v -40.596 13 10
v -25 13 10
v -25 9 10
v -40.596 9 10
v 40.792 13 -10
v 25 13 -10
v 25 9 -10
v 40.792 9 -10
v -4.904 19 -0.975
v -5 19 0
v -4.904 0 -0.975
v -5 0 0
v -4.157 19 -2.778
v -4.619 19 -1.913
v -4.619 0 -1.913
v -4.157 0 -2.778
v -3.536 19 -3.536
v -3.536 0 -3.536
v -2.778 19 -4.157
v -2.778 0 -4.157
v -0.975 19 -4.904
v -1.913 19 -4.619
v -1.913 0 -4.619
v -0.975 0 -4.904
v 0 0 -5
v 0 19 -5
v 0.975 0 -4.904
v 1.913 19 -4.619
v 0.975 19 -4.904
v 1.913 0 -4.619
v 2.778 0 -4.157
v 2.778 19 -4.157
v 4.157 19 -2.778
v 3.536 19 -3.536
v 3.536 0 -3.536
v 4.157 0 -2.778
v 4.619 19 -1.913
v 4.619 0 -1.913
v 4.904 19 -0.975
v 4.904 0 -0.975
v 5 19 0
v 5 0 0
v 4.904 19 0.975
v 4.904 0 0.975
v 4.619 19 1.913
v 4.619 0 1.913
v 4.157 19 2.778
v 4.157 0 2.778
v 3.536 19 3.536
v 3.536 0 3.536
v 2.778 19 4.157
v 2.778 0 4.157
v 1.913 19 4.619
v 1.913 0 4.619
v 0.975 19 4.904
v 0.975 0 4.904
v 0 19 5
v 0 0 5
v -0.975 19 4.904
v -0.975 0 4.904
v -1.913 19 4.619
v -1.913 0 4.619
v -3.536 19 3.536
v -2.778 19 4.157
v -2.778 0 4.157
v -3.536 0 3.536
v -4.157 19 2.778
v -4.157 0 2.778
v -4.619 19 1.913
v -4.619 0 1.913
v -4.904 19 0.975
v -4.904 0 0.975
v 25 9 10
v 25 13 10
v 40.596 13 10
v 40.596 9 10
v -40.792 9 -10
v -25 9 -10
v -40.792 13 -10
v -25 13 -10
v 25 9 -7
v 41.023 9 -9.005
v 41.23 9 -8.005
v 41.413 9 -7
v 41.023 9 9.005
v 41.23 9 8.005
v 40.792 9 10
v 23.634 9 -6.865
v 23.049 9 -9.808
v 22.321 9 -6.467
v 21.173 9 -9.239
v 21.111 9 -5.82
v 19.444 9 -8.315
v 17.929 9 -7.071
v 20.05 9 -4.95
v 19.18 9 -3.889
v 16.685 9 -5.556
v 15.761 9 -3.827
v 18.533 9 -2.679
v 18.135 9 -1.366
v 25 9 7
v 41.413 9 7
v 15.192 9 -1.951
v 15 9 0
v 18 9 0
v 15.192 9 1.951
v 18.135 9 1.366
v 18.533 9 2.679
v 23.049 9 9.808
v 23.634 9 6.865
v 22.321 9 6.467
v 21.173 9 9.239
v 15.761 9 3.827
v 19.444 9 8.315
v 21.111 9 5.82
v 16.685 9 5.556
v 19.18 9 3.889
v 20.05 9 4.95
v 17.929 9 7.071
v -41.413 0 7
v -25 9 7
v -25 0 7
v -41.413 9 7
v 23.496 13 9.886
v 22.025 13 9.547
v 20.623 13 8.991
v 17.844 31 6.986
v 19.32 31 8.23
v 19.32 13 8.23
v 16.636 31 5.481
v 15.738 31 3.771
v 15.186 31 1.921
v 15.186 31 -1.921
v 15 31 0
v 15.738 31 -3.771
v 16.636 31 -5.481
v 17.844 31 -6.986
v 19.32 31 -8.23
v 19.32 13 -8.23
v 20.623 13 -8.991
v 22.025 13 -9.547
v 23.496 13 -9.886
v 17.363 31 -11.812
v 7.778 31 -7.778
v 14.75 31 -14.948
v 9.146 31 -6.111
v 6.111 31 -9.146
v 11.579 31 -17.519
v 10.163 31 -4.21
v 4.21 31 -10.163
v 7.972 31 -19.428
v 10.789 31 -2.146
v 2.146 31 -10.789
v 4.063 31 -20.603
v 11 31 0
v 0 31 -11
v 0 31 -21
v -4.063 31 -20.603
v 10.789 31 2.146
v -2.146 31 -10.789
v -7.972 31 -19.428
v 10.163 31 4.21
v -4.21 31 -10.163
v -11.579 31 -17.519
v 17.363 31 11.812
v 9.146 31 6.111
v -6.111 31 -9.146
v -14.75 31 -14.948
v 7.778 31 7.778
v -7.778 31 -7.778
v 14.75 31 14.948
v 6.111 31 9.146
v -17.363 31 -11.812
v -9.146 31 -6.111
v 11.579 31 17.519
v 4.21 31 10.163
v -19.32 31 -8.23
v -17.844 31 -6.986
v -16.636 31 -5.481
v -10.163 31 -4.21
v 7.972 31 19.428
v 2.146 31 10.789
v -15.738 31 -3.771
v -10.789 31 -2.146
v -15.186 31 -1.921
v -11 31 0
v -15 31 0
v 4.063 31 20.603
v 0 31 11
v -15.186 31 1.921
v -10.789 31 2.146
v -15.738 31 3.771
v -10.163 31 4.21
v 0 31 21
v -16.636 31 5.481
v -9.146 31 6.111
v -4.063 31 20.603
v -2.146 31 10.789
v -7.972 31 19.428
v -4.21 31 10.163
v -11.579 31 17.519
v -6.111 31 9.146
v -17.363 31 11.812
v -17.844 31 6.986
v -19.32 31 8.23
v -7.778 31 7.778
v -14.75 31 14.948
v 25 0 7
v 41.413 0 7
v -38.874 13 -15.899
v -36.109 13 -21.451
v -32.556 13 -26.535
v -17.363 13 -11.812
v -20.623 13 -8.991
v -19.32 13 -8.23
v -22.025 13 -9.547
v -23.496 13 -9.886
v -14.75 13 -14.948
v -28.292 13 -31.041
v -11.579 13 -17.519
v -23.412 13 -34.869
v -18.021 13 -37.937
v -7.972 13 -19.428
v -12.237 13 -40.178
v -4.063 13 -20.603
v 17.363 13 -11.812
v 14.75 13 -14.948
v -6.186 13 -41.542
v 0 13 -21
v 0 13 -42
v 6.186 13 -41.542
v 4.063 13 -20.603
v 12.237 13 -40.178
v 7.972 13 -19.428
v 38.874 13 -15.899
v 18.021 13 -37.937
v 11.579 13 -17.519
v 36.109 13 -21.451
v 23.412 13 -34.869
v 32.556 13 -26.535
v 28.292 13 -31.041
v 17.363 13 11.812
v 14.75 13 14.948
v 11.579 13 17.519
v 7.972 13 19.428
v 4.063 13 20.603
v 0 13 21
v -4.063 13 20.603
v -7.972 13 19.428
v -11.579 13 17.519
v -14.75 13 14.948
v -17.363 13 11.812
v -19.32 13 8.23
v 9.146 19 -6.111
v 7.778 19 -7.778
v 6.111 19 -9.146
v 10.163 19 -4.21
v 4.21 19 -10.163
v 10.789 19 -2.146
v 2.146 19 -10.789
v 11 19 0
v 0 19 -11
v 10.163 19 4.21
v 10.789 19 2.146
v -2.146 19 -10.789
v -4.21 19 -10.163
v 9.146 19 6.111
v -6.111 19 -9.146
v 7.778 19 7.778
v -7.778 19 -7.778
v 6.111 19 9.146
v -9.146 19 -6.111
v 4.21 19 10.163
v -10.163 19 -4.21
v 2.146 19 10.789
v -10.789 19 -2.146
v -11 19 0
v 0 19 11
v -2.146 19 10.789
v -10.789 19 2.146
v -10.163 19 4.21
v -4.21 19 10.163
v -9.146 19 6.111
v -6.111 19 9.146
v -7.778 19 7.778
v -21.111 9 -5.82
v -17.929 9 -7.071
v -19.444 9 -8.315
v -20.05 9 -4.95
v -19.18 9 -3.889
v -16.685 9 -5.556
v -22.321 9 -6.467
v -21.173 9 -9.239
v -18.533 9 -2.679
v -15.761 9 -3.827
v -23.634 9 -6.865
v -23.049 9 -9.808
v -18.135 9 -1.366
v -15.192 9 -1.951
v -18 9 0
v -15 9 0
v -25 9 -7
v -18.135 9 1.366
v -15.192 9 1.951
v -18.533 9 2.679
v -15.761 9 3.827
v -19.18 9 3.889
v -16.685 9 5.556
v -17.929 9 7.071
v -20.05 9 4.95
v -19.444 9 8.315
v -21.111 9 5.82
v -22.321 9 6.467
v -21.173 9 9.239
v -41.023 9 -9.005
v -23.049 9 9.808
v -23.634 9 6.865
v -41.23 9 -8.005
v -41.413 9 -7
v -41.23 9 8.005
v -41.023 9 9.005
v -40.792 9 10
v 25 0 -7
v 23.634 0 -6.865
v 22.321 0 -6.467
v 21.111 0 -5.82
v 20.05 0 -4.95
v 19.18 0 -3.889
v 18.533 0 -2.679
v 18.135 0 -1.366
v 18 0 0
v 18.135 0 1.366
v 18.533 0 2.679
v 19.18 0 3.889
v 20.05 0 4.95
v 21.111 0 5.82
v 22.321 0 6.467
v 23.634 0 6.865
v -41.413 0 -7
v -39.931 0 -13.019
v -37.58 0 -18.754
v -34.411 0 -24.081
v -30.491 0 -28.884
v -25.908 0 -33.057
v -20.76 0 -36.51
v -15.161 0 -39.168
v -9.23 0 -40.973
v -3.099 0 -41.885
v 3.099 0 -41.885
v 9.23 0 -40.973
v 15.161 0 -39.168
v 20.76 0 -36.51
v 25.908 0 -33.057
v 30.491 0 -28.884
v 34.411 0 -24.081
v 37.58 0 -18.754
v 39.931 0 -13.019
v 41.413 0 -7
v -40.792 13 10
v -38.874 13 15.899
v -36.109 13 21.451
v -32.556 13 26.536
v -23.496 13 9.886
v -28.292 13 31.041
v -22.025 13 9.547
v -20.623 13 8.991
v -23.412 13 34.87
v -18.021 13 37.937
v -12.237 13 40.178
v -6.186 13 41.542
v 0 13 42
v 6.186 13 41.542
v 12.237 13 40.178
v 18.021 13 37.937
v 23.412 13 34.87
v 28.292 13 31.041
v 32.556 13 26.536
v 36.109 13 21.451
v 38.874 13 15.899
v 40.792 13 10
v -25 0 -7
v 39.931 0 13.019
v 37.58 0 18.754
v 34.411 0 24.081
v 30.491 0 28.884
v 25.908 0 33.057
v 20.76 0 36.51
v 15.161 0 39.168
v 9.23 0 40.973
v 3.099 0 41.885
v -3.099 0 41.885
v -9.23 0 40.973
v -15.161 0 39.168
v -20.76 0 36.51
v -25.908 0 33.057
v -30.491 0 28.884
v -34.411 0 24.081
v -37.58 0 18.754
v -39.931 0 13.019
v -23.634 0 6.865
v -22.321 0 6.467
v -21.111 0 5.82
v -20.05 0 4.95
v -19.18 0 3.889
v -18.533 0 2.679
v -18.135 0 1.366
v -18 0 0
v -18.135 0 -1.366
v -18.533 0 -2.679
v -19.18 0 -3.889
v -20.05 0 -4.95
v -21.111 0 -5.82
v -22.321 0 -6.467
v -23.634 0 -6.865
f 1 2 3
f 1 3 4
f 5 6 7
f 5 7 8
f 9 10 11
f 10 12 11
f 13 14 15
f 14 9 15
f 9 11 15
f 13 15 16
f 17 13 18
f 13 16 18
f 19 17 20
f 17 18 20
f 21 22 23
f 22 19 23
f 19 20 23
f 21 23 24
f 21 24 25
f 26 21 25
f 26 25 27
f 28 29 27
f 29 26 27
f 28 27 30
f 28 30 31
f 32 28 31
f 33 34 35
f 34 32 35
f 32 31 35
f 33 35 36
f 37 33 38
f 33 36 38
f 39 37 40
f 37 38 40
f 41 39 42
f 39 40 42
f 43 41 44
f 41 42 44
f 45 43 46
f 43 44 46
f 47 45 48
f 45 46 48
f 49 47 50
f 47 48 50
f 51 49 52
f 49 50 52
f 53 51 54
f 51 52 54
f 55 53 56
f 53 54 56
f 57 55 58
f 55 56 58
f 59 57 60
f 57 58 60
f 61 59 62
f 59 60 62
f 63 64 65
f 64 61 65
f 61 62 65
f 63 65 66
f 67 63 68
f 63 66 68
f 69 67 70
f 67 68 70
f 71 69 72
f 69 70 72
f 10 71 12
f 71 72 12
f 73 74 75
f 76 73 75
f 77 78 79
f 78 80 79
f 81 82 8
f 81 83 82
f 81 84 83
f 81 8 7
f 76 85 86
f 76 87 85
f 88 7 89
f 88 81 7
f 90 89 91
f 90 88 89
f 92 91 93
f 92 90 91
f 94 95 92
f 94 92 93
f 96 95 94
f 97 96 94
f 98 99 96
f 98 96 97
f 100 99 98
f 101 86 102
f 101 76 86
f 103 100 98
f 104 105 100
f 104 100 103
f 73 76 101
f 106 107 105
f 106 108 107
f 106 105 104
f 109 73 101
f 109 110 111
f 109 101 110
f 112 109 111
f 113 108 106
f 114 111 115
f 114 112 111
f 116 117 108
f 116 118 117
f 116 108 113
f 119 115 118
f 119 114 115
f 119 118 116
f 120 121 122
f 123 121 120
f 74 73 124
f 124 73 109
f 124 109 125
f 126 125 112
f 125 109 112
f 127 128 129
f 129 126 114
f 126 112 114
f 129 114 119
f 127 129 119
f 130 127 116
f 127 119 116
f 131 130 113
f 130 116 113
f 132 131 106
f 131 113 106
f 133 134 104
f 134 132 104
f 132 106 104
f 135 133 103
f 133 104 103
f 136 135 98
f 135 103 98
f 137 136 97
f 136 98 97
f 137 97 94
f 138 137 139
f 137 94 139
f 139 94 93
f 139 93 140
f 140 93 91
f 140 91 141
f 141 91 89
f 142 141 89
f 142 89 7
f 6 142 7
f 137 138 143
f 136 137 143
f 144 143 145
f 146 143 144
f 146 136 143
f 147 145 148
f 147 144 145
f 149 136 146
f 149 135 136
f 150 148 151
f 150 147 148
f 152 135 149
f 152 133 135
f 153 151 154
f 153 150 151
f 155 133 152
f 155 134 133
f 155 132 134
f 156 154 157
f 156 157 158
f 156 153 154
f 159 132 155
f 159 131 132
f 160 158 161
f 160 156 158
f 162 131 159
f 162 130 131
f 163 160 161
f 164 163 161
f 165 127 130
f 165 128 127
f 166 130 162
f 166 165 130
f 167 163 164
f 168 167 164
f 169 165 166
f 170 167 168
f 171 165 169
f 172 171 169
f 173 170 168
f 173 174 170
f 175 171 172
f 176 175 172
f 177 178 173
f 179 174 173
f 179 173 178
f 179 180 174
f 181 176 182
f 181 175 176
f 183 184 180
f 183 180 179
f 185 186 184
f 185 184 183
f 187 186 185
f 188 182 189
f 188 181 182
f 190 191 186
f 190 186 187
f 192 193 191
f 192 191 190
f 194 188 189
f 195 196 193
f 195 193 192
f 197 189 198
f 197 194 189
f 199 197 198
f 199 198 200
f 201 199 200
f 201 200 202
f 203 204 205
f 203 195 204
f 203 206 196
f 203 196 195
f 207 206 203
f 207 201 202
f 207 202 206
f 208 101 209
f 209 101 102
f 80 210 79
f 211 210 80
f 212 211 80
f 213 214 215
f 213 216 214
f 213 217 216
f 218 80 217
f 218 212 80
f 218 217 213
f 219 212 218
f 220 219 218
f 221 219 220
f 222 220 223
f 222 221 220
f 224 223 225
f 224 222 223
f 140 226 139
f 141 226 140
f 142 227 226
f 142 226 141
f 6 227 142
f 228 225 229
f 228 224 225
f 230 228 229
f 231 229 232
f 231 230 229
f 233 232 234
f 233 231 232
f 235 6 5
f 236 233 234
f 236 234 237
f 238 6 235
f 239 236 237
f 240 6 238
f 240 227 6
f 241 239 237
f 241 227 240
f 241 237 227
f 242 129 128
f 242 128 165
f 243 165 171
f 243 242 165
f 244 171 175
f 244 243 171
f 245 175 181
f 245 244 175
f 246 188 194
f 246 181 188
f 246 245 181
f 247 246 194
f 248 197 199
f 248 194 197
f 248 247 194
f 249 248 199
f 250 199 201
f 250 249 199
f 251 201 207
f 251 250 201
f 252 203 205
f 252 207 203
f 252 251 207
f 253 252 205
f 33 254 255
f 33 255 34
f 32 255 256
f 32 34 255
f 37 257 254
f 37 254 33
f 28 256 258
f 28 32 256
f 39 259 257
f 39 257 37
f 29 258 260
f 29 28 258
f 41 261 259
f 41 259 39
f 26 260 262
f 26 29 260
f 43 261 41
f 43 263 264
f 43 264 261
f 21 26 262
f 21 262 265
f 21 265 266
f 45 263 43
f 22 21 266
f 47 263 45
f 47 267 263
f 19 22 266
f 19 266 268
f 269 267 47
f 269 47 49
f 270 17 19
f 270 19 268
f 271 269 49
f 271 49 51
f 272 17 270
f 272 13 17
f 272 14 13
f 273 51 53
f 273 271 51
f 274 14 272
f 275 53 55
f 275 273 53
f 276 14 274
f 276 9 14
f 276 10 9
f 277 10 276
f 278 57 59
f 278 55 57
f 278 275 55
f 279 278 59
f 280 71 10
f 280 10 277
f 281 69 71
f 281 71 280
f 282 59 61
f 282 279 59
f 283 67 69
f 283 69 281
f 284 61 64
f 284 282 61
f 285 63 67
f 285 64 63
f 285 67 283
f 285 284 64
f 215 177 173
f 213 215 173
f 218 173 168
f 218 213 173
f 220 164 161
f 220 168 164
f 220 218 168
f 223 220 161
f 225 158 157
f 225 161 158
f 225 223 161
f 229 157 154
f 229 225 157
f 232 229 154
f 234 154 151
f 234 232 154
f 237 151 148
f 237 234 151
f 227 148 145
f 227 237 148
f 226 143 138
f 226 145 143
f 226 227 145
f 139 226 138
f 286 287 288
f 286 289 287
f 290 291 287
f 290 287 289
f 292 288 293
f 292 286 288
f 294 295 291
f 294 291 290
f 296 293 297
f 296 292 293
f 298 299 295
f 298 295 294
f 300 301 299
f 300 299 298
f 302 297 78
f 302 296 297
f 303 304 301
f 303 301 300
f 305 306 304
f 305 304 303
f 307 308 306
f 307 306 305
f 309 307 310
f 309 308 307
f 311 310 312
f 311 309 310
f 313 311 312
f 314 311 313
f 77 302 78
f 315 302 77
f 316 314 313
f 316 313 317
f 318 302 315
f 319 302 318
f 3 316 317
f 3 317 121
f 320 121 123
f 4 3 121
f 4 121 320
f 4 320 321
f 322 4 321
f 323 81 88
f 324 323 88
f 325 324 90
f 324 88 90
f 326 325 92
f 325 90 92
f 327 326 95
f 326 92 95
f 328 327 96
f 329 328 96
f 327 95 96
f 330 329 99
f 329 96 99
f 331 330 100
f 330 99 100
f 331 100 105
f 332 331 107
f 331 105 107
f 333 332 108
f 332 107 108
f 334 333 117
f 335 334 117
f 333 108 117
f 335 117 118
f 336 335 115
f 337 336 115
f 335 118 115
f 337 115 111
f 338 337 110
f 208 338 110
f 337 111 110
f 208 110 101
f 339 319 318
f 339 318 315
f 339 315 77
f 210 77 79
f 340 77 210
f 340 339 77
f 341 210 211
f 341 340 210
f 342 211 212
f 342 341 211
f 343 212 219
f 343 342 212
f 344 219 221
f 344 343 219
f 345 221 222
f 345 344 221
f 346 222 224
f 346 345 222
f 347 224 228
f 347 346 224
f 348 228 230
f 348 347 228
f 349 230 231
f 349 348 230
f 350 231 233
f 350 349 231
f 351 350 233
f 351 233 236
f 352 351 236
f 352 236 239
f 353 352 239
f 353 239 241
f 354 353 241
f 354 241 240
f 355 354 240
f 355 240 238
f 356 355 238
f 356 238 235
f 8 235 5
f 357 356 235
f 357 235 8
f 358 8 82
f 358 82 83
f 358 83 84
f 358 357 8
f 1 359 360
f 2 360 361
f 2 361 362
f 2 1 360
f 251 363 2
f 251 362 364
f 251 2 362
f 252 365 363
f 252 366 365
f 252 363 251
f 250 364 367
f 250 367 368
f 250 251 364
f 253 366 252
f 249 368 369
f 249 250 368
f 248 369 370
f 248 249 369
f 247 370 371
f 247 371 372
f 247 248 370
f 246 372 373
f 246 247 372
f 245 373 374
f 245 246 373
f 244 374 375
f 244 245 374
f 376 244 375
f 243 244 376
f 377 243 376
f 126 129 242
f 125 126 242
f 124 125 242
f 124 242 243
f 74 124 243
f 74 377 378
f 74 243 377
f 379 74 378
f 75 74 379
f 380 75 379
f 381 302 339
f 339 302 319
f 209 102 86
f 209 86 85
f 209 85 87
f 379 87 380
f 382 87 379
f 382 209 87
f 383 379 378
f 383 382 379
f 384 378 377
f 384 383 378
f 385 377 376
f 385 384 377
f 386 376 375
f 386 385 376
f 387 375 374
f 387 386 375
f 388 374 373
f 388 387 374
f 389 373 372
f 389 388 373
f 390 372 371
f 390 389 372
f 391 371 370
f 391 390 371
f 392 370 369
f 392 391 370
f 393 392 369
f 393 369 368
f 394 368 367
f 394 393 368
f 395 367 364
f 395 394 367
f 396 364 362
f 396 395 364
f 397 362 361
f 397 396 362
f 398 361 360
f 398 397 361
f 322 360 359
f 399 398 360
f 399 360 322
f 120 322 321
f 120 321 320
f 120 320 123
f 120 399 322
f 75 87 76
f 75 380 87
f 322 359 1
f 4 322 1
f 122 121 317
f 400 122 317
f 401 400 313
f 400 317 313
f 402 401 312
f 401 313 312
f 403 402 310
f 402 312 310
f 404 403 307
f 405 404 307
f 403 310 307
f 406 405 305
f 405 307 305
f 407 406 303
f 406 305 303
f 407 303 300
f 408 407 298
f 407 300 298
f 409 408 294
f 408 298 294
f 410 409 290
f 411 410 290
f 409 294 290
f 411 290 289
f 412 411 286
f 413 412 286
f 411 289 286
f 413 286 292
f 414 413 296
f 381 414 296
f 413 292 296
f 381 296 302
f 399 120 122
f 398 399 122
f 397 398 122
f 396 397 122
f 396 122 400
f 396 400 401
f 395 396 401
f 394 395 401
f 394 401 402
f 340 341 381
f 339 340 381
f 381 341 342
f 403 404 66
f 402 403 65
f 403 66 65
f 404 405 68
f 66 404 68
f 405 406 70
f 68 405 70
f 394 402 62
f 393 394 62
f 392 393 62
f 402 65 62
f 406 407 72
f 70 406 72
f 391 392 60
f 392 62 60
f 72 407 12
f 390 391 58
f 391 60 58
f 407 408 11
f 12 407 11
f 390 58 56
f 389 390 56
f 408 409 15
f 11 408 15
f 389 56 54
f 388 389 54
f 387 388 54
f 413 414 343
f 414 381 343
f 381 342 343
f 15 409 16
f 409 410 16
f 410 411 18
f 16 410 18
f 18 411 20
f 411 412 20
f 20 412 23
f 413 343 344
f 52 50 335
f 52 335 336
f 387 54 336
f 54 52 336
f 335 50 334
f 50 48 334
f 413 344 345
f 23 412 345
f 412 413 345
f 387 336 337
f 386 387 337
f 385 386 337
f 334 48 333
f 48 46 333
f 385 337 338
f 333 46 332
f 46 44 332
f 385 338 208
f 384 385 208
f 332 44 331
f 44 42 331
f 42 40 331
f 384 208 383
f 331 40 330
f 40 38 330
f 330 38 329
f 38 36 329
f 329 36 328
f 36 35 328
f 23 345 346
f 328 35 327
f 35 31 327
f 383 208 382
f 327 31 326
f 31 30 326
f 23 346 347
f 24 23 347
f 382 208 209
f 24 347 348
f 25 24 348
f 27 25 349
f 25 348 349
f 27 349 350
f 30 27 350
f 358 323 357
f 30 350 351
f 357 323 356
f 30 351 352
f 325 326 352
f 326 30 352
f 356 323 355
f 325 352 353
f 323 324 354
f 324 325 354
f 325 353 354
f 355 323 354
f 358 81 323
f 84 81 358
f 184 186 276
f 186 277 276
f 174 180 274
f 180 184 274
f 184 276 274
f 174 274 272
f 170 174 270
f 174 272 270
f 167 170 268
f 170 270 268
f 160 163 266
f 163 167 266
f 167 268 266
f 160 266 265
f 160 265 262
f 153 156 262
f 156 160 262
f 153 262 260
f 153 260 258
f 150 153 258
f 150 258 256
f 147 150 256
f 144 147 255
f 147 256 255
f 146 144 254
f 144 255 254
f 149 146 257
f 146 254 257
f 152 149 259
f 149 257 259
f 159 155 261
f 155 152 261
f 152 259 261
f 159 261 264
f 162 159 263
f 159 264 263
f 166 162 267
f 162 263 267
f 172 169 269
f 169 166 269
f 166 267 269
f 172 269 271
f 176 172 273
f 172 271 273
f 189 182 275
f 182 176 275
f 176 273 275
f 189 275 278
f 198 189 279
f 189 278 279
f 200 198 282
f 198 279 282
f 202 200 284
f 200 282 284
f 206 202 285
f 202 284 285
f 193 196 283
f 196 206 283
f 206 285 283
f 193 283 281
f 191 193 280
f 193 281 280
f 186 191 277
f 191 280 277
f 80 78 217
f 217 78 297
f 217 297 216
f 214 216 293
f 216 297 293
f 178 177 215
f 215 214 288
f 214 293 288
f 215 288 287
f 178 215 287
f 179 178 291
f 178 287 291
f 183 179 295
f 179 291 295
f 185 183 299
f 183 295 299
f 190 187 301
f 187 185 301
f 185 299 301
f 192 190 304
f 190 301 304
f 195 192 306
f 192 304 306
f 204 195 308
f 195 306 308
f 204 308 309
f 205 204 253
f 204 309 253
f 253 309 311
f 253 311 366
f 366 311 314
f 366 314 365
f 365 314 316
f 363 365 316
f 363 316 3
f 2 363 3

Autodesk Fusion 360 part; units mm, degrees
sketch "Sketch1" plane through (0, 0, 0) normal (0, 1, 0) x (1, 0, 0)
  circle A0 centre (0, 0) radius 42
  dimension "d1" = 84
extrude "Extrude1" add sketch "Sketch1" along normal blind 13
sketch "Sketch2" plane through (0, 13, 0) normal (0, 1, 0) x (-1, 0, 0)
  circle A0 centre (0, 0) radius 42
sketch "Sketch3" plane through (0, 13, 0) normal (0, 1, 0) x (-1, 0, 0)
  line L0 (0, 0) -> (25, 0) construction
  line L1 (0, 0) -> (-25, 0) construction
  line L2 (-25, 0) -> (-25, 11) construction
  line L3 (-25, 11) -> (-25, -10) construction
  line L4 (-25, -10) -> (-40.3348, -10)
  line L5 (-25, 10) -> (-40.5961, 10)
  arc A0 (-25, -10) -> (-25, 10) centre (-25, 0) ccw
  line L6 (-25, -7) -> (-42.662, -7)
  arc A1 (-25, -7) -> (-25, 7) centre (-25, 0) ccw
  line L7 (-25, 7) -> (-45, 7)
  line L8 (-40.3348, -10) -> (-41.543, -10)
  line L9 (-41.543, -10) -> (-46, -10)
  line L10 (-46, -10) -> (-49, 1)
  line L11 (-49, 1) -> (-46.5662, 10.0079)
  line L12 (-46.5662, 10.0079) -> (-40.5961, 10)
  line L13 (-42.662, -7) -> (-45, 7)
  line L14 (0, -45) -> (0, 45) construction
  arc A2 (25, 10) -> (25, -10) centre (25, 0) ccw
  arc A3 (25, 7) -> (25, -7) centre (25, 0) ccw
  line L15 (25, 7) -> (45, 7)
  line L16 (25, 10) -> (40.5961, 10)
  line L17 (46.5662, 10.0079) -> (40.5961, 10)
  line L18 (49, 1) -> (46.5662, 10.0079)
  line L19 (46, -10) -> (49, 1)
  line L20 (25, -10) -> (40.3348, -10)
  line L21 (41.543, -10) -> (46, -10)
  line L22 (42.662, -7) -> (45, 7)
  line L23 (25, -7) -> (42.662, -7)
  line L24 (40.3348, -10) -> (41.543, -10)
  circle A4 centre (0, 0) radius 21
  circle A5 centre (0, 0) radius 11
  circle A6 centre (0, 0) radius 5
  dimension "d4" = 25
  dimension "d5" = 25
  dimension "d7" = 20
  dimension "d8" = 14
  dimension "d13" = 42
  dimension "d14" = 22
  dimension "d15" = 10
extrude "Extrude4" cut sketch "Sketch3" against normal blind 4 contours L4 L5 A0 L6 A1 L7 L8 L9 L10 L11 L12 L13 A4 | A0 A1 A4 | A2 A3 L15 L16 L17 L18 L19 L20 L21 L22 L23 L24 A4 | A2 A3 A4
extrude "Extrude5" cut sketch "Sketch3" against normal blind 13 contours A1 A4 | L6 A1 L7 L13 A4 | A3 L15 L22 L23 A4 | A3 A4
extrude "Extrude6" cut sketch "Sketch3" against normal blind 13 contours A6
extrude "Extrude7" add sketch "Sketch3" along normal blind 6 contours A5
extrude "Extrude8" add sketch "Sketch3" along normal blind 18 contours A0 A2 A4
